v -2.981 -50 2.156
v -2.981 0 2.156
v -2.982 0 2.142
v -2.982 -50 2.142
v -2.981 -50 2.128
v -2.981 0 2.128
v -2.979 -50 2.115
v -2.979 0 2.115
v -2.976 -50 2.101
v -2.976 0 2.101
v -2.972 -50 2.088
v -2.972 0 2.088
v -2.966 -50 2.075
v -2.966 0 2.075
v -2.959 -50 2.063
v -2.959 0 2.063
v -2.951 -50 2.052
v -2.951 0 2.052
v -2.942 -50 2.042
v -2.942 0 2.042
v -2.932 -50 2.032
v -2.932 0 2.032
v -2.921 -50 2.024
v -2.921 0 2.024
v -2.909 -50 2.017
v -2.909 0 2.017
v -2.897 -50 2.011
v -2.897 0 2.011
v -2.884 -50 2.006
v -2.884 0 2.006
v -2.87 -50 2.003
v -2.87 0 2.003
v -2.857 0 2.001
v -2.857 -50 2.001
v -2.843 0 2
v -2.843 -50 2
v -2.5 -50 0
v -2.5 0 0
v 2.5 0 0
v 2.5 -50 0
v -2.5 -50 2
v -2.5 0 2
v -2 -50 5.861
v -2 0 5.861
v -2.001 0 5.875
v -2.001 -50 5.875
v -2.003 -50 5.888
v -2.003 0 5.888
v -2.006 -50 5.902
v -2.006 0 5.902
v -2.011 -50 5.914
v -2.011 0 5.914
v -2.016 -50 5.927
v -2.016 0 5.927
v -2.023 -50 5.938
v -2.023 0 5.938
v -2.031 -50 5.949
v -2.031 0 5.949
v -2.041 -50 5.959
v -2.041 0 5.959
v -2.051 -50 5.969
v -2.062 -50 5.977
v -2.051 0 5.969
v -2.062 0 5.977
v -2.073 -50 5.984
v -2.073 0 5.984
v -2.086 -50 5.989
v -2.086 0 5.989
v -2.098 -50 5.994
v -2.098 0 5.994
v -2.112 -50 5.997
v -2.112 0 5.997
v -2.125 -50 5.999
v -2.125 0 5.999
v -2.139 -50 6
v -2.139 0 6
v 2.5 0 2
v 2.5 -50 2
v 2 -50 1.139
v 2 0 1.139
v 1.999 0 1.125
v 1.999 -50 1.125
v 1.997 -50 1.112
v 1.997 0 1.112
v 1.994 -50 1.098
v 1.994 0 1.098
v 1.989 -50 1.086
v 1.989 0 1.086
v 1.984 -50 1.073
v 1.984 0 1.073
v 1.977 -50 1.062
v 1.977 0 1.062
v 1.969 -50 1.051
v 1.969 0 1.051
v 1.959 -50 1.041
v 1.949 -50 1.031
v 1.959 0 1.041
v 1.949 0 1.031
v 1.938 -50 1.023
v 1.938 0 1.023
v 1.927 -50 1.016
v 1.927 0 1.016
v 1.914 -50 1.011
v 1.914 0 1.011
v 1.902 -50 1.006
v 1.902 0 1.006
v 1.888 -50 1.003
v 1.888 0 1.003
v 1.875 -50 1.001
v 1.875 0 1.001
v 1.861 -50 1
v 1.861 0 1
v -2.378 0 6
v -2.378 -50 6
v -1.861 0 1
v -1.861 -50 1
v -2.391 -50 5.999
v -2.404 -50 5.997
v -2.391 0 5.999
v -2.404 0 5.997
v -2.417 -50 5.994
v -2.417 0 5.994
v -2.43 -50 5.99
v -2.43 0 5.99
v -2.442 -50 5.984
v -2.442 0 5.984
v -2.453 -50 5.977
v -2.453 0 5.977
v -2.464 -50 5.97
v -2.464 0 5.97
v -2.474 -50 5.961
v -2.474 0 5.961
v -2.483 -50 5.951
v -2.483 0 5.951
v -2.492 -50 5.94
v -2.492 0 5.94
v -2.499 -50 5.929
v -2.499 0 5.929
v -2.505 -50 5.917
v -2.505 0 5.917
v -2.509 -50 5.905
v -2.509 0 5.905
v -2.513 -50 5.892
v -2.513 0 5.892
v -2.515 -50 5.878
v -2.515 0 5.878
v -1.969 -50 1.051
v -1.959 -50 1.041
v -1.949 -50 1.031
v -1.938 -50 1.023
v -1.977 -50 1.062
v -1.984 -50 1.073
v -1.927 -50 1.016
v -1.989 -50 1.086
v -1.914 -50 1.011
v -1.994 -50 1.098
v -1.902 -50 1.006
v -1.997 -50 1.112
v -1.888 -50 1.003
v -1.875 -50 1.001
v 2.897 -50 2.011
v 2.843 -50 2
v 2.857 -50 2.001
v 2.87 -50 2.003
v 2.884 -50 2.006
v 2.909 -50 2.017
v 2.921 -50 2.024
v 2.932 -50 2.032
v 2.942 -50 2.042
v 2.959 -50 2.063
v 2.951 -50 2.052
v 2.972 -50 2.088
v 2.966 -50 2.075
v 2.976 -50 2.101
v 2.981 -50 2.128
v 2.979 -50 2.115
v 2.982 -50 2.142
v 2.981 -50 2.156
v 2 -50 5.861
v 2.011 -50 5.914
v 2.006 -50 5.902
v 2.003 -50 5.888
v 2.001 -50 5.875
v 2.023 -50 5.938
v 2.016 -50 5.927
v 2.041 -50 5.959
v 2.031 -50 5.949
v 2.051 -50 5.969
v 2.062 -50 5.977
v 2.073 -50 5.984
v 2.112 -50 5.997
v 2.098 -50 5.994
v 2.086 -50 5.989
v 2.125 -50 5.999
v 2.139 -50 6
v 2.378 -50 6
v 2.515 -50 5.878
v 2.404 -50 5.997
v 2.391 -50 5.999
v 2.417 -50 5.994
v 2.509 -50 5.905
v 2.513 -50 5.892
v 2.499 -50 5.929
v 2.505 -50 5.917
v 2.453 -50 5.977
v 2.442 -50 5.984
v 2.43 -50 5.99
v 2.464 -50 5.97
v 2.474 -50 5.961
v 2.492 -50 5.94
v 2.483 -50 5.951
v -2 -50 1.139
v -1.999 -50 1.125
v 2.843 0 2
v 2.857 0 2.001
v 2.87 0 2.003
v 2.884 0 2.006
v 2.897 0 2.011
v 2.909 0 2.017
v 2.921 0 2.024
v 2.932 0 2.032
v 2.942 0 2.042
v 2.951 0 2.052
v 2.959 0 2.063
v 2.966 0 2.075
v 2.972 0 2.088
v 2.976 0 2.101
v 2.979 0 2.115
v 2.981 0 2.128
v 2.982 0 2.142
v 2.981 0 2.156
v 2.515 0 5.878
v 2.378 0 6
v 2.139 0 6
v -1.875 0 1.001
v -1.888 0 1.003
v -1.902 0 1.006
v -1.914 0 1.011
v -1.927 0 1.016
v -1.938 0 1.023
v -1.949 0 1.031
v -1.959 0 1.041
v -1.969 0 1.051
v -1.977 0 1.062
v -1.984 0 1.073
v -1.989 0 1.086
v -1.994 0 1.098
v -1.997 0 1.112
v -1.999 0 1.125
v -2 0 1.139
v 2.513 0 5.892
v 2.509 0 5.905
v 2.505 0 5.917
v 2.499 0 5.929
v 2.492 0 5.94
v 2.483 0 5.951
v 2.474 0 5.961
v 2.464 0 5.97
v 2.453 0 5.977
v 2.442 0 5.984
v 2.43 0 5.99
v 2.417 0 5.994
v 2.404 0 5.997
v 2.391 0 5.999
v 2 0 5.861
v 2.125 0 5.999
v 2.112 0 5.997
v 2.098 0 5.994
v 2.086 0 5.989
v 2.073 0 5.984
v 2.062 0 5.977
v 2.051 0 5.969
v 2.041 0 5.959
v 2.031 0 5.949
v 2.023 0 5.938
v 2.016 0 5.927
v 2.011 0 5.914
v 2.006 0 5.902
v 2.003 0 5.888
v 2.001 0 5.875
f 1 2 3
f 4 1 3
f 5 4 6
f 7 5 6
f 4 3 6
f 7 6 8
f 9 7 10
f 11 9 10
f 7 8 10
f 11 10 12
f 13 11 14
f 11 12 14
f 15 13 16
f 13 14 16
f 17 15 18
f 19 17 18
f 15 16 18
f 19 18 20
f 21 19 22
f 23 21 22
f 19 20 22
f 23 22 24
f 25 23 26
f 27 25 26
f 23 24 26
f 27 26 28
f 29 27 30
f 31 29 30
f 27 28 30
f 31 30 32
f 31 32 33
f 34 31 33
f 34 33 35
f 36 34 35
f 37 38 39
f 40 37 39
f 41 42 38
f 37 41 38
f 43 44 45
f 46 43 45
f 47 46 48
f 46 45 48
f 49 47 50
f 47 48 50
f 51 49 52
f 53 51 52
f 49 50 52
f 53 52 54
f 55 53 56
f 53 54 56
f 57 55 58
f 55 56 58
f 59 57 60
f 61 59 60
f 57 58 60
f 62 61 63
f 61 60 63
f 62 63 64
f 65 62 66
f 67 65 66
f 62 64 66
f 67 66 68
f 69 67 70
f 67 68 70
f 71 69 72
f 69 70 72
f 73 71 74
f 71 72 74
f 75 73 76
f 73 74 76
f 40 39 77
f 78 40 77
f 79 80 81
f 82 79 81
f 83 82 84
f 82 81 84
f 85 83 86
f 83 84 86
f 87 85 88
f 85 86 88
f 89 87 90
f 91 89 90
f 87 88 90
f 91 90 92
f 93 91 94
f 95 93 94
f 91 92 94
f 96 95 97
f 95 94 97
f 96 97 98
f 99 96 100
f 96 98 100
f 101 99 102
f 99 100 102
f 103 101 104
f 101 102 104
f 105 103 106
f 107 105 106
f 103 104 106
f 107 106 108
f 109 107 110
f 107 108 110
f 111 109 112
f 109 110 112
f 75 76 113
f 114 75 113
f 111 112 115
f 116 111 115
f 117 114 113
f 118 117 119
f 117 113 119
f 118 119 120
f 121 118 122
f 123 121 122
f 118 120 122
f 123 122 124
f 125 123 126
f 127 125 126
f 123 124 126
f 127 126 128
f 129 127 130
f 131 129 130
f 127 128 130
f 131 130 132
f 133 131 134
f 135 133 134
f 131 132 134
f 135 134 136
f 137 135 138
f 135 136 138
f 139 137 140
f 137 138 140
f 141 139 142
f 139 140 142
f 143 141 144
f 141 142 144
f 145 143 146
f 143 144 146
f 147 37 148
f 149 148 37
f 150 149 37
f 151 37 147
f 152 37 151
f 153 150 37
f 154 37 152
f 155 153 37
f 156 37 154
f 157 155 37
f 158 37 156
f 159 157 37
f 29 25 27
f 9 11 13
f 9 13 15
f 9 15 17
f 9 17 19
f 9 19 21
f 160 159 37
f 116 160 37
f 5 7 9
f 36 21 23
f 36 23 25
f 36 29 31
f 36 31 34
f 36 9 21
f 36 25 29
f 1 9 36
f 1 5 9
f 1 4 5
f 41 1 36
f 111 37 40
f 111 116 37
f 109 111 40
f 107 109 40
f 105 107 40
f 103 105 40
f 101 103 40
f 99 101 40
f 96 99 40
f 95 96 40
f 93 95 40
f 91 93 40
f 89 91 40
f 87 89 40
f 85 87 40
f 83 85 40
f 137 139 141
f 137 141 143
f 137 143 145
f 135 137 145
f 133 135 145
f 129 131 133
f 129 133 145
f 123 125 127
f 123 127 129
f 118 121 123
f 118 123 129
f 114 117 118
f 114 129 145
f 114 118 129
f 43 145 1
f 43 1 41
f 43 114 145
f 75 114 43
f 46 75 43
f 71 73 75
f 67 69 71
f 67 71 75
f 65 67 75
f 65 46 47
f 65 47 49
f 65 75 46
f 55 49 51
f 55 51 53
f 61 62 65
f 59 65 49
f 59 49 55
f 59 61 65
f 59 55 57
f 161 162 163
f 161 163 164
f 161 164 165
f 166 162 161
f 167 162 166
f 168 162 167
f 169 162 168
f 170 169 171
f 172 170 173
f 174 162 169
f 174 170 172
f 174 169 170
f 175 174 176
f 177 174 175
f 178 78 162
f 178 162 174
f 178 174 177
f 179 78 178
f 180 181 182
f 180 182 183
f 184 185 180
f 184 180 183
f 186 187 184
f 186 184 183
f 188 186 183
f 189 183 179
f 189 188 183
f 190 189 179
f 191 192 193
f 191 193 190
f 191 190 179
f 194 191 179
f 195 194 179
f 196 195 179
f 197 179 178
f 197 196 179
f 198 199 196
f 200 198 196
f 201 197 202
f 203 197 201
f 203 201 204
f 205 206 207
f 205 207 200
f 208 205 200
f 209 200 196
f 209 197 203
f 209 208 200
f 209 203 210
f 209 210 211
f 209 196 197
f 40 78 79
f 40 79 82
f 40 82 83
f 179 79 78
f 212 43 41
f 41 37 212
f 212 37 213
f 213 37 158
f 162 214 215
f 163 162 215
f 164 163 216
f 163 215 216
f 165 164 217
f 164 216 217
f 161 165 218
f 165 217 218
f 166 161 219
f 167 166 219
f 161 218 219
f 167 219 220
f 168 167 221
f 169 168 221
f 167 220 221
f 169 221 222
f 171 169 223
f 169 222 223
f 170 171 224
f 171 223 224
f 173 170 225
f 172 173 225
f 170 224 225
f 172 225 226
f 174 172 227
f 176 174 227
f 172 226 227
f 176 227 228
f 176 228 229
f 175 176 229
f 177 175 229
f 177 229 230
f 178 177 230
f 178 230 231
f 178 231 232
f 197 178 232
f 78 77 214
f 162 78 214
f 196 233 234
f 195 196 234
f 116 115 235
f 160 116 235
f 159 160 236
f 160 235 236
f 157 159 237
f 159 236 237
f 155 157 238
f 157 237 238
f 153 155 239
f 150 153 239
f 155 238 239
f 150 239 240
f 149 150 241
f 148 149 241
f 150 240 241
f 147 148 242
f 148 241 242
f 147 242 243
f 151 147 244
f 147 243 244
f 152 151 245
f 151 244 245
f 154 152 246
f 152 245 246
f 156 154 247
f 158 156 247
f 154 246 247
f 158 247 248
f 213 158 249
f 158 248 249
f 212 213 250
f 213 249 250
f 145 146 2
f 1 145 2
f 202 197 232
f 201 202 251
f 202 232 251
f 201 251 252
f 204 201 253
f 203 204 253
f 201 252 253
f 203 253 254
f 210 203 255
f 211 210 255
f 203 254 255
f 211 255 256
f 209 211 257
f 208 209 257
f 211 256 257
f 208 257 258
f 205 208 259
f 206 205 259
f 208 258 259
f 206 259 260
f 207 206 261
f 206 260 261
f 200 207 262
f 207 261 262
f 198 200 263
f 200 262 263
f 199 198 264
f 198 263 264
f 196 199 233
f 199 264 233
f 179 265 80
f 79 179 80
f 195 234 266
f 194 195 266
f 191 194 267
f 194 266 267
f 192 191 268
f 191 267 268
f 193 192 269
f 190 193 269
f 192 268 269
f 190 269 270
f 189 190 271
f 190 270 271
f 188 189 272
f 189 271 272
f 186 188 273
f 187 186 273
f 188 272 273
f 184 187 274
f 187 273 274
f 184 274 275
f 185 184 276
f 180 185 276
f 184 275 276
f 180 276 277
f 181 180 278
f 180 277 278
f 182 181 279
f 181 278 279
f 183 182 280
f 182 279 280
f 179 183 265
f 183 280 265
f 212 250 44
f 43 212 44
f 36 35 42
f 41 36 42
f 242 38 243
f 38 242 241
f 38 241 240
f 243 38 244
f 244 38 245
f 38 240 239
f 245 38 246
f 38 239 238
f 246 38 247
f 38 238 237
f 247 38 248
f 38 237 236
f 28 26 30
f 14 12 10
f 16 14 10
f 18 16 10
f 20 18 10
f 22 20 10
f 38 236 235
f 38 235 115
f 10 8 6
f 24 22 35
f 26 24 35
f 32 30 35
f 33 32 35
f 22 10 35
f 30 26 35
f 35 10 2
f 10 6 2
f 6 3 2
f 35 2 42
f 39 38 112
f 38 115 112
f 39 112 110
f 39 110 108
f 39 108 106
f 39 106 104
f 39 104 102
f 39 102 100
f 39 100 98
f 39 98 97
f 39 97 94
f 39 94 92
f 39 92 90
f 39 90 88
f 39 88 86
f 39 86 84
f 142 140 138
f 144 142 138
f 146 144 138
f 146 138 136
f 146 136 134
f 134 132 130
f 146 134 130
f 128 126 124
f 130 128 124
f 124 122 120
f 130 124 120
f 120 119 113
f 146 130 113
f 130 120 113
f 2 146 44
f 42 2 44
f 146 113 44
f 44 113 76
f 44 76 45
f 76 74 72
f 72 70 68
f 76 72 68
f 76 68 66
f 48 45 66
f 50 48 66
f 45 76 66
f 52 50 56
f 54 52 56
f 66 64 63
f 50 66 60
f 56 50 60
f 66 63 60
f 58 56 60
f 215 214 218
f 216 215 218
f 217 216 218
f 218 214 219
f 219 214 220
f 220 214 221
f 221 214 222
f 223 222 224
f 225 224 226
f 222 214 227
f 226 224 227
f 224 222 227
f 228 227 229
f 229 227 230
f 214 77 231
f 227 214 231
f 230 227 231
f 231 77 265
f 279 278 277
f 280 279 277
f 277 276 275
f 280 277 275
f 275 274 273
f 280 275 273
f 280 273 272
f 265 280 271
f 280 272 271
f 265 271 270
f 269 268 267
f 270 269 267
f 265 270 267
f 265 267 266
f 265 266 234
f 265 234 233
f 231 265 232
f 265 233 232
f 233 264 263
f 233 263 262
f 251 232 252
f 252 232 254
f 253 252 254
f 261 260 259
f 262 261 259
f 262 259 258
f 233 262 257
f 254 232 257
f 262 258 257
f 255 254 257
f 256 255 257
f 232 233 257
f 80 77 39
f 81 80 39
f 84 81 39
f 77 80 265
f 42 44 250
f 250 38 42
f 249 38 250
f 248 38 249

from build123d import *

# Parameters (mm, degrees)
F1_DEPTH = 50


with BuildPart() as f1:
    # F0 (on Front) → F1 (new body)
    with BuildSketch(Plane.XZ):
        with BuildLine():
            Line((-2.5, 0), (0, 0))
            Line((0, 0), (2.5, 0))
            Line((2.5, 0), (2.5, 2))
            Line((2.5, 2), (2.842854, 2))
            ThreePointArc((2.842854, 2), (2.946854, 2.046917), (2.980508, 2.155933))
            Line((2.980508, 2.155933), (2.51519, 5.878481))
            ThreePointArc((2.51519, 5.878481), (2.469344, 5.965274), (2.377535, 6))
            Line((2.377535, 6), (2.138726, 6))
            ThreePointArc((2.138726, 6), (2.040632, 5.959368), (2, 5.861274))
            Line((2, 5.861274), (2, 1.138726))
            ThreePointArc((2, 1.138726), (1.959368, 1.040632), (1.861274, 1))
            Line((1.861274, 1), (0, 1))
            Line((0, 1), (-1.861274, 1))
            ThreePointArc((-1.861274, 1), (-1.959368, 1.040632), (-2, 1.138726))
            Line((-2, 1.138726), (-2, 5.861274))
            ThreePointArc((-2, 5.861274), (-2.040632, 5.959368), (-2.138726, 6))
            Line((-2.138726, 6), (-2.377535, 6))
            ThreePointArc((-2.377535, 6), (-2.469344, 5.965274), (-2.51519, 5.878481))
            Line((-2.51519, 5.878481), (-2.980508, 2.155933))
            ThreePointArc((-2.980508, 2.155933), (-2.946854, 2.046917), (-2.842854, 2))
            Line((-2.842854, 2), (-2.5, 2))
            Line((-2.5, 2), (-2.5, 0))
        make_face()
    extrude(amount=F1_DEPTH)


solid = f1.part
